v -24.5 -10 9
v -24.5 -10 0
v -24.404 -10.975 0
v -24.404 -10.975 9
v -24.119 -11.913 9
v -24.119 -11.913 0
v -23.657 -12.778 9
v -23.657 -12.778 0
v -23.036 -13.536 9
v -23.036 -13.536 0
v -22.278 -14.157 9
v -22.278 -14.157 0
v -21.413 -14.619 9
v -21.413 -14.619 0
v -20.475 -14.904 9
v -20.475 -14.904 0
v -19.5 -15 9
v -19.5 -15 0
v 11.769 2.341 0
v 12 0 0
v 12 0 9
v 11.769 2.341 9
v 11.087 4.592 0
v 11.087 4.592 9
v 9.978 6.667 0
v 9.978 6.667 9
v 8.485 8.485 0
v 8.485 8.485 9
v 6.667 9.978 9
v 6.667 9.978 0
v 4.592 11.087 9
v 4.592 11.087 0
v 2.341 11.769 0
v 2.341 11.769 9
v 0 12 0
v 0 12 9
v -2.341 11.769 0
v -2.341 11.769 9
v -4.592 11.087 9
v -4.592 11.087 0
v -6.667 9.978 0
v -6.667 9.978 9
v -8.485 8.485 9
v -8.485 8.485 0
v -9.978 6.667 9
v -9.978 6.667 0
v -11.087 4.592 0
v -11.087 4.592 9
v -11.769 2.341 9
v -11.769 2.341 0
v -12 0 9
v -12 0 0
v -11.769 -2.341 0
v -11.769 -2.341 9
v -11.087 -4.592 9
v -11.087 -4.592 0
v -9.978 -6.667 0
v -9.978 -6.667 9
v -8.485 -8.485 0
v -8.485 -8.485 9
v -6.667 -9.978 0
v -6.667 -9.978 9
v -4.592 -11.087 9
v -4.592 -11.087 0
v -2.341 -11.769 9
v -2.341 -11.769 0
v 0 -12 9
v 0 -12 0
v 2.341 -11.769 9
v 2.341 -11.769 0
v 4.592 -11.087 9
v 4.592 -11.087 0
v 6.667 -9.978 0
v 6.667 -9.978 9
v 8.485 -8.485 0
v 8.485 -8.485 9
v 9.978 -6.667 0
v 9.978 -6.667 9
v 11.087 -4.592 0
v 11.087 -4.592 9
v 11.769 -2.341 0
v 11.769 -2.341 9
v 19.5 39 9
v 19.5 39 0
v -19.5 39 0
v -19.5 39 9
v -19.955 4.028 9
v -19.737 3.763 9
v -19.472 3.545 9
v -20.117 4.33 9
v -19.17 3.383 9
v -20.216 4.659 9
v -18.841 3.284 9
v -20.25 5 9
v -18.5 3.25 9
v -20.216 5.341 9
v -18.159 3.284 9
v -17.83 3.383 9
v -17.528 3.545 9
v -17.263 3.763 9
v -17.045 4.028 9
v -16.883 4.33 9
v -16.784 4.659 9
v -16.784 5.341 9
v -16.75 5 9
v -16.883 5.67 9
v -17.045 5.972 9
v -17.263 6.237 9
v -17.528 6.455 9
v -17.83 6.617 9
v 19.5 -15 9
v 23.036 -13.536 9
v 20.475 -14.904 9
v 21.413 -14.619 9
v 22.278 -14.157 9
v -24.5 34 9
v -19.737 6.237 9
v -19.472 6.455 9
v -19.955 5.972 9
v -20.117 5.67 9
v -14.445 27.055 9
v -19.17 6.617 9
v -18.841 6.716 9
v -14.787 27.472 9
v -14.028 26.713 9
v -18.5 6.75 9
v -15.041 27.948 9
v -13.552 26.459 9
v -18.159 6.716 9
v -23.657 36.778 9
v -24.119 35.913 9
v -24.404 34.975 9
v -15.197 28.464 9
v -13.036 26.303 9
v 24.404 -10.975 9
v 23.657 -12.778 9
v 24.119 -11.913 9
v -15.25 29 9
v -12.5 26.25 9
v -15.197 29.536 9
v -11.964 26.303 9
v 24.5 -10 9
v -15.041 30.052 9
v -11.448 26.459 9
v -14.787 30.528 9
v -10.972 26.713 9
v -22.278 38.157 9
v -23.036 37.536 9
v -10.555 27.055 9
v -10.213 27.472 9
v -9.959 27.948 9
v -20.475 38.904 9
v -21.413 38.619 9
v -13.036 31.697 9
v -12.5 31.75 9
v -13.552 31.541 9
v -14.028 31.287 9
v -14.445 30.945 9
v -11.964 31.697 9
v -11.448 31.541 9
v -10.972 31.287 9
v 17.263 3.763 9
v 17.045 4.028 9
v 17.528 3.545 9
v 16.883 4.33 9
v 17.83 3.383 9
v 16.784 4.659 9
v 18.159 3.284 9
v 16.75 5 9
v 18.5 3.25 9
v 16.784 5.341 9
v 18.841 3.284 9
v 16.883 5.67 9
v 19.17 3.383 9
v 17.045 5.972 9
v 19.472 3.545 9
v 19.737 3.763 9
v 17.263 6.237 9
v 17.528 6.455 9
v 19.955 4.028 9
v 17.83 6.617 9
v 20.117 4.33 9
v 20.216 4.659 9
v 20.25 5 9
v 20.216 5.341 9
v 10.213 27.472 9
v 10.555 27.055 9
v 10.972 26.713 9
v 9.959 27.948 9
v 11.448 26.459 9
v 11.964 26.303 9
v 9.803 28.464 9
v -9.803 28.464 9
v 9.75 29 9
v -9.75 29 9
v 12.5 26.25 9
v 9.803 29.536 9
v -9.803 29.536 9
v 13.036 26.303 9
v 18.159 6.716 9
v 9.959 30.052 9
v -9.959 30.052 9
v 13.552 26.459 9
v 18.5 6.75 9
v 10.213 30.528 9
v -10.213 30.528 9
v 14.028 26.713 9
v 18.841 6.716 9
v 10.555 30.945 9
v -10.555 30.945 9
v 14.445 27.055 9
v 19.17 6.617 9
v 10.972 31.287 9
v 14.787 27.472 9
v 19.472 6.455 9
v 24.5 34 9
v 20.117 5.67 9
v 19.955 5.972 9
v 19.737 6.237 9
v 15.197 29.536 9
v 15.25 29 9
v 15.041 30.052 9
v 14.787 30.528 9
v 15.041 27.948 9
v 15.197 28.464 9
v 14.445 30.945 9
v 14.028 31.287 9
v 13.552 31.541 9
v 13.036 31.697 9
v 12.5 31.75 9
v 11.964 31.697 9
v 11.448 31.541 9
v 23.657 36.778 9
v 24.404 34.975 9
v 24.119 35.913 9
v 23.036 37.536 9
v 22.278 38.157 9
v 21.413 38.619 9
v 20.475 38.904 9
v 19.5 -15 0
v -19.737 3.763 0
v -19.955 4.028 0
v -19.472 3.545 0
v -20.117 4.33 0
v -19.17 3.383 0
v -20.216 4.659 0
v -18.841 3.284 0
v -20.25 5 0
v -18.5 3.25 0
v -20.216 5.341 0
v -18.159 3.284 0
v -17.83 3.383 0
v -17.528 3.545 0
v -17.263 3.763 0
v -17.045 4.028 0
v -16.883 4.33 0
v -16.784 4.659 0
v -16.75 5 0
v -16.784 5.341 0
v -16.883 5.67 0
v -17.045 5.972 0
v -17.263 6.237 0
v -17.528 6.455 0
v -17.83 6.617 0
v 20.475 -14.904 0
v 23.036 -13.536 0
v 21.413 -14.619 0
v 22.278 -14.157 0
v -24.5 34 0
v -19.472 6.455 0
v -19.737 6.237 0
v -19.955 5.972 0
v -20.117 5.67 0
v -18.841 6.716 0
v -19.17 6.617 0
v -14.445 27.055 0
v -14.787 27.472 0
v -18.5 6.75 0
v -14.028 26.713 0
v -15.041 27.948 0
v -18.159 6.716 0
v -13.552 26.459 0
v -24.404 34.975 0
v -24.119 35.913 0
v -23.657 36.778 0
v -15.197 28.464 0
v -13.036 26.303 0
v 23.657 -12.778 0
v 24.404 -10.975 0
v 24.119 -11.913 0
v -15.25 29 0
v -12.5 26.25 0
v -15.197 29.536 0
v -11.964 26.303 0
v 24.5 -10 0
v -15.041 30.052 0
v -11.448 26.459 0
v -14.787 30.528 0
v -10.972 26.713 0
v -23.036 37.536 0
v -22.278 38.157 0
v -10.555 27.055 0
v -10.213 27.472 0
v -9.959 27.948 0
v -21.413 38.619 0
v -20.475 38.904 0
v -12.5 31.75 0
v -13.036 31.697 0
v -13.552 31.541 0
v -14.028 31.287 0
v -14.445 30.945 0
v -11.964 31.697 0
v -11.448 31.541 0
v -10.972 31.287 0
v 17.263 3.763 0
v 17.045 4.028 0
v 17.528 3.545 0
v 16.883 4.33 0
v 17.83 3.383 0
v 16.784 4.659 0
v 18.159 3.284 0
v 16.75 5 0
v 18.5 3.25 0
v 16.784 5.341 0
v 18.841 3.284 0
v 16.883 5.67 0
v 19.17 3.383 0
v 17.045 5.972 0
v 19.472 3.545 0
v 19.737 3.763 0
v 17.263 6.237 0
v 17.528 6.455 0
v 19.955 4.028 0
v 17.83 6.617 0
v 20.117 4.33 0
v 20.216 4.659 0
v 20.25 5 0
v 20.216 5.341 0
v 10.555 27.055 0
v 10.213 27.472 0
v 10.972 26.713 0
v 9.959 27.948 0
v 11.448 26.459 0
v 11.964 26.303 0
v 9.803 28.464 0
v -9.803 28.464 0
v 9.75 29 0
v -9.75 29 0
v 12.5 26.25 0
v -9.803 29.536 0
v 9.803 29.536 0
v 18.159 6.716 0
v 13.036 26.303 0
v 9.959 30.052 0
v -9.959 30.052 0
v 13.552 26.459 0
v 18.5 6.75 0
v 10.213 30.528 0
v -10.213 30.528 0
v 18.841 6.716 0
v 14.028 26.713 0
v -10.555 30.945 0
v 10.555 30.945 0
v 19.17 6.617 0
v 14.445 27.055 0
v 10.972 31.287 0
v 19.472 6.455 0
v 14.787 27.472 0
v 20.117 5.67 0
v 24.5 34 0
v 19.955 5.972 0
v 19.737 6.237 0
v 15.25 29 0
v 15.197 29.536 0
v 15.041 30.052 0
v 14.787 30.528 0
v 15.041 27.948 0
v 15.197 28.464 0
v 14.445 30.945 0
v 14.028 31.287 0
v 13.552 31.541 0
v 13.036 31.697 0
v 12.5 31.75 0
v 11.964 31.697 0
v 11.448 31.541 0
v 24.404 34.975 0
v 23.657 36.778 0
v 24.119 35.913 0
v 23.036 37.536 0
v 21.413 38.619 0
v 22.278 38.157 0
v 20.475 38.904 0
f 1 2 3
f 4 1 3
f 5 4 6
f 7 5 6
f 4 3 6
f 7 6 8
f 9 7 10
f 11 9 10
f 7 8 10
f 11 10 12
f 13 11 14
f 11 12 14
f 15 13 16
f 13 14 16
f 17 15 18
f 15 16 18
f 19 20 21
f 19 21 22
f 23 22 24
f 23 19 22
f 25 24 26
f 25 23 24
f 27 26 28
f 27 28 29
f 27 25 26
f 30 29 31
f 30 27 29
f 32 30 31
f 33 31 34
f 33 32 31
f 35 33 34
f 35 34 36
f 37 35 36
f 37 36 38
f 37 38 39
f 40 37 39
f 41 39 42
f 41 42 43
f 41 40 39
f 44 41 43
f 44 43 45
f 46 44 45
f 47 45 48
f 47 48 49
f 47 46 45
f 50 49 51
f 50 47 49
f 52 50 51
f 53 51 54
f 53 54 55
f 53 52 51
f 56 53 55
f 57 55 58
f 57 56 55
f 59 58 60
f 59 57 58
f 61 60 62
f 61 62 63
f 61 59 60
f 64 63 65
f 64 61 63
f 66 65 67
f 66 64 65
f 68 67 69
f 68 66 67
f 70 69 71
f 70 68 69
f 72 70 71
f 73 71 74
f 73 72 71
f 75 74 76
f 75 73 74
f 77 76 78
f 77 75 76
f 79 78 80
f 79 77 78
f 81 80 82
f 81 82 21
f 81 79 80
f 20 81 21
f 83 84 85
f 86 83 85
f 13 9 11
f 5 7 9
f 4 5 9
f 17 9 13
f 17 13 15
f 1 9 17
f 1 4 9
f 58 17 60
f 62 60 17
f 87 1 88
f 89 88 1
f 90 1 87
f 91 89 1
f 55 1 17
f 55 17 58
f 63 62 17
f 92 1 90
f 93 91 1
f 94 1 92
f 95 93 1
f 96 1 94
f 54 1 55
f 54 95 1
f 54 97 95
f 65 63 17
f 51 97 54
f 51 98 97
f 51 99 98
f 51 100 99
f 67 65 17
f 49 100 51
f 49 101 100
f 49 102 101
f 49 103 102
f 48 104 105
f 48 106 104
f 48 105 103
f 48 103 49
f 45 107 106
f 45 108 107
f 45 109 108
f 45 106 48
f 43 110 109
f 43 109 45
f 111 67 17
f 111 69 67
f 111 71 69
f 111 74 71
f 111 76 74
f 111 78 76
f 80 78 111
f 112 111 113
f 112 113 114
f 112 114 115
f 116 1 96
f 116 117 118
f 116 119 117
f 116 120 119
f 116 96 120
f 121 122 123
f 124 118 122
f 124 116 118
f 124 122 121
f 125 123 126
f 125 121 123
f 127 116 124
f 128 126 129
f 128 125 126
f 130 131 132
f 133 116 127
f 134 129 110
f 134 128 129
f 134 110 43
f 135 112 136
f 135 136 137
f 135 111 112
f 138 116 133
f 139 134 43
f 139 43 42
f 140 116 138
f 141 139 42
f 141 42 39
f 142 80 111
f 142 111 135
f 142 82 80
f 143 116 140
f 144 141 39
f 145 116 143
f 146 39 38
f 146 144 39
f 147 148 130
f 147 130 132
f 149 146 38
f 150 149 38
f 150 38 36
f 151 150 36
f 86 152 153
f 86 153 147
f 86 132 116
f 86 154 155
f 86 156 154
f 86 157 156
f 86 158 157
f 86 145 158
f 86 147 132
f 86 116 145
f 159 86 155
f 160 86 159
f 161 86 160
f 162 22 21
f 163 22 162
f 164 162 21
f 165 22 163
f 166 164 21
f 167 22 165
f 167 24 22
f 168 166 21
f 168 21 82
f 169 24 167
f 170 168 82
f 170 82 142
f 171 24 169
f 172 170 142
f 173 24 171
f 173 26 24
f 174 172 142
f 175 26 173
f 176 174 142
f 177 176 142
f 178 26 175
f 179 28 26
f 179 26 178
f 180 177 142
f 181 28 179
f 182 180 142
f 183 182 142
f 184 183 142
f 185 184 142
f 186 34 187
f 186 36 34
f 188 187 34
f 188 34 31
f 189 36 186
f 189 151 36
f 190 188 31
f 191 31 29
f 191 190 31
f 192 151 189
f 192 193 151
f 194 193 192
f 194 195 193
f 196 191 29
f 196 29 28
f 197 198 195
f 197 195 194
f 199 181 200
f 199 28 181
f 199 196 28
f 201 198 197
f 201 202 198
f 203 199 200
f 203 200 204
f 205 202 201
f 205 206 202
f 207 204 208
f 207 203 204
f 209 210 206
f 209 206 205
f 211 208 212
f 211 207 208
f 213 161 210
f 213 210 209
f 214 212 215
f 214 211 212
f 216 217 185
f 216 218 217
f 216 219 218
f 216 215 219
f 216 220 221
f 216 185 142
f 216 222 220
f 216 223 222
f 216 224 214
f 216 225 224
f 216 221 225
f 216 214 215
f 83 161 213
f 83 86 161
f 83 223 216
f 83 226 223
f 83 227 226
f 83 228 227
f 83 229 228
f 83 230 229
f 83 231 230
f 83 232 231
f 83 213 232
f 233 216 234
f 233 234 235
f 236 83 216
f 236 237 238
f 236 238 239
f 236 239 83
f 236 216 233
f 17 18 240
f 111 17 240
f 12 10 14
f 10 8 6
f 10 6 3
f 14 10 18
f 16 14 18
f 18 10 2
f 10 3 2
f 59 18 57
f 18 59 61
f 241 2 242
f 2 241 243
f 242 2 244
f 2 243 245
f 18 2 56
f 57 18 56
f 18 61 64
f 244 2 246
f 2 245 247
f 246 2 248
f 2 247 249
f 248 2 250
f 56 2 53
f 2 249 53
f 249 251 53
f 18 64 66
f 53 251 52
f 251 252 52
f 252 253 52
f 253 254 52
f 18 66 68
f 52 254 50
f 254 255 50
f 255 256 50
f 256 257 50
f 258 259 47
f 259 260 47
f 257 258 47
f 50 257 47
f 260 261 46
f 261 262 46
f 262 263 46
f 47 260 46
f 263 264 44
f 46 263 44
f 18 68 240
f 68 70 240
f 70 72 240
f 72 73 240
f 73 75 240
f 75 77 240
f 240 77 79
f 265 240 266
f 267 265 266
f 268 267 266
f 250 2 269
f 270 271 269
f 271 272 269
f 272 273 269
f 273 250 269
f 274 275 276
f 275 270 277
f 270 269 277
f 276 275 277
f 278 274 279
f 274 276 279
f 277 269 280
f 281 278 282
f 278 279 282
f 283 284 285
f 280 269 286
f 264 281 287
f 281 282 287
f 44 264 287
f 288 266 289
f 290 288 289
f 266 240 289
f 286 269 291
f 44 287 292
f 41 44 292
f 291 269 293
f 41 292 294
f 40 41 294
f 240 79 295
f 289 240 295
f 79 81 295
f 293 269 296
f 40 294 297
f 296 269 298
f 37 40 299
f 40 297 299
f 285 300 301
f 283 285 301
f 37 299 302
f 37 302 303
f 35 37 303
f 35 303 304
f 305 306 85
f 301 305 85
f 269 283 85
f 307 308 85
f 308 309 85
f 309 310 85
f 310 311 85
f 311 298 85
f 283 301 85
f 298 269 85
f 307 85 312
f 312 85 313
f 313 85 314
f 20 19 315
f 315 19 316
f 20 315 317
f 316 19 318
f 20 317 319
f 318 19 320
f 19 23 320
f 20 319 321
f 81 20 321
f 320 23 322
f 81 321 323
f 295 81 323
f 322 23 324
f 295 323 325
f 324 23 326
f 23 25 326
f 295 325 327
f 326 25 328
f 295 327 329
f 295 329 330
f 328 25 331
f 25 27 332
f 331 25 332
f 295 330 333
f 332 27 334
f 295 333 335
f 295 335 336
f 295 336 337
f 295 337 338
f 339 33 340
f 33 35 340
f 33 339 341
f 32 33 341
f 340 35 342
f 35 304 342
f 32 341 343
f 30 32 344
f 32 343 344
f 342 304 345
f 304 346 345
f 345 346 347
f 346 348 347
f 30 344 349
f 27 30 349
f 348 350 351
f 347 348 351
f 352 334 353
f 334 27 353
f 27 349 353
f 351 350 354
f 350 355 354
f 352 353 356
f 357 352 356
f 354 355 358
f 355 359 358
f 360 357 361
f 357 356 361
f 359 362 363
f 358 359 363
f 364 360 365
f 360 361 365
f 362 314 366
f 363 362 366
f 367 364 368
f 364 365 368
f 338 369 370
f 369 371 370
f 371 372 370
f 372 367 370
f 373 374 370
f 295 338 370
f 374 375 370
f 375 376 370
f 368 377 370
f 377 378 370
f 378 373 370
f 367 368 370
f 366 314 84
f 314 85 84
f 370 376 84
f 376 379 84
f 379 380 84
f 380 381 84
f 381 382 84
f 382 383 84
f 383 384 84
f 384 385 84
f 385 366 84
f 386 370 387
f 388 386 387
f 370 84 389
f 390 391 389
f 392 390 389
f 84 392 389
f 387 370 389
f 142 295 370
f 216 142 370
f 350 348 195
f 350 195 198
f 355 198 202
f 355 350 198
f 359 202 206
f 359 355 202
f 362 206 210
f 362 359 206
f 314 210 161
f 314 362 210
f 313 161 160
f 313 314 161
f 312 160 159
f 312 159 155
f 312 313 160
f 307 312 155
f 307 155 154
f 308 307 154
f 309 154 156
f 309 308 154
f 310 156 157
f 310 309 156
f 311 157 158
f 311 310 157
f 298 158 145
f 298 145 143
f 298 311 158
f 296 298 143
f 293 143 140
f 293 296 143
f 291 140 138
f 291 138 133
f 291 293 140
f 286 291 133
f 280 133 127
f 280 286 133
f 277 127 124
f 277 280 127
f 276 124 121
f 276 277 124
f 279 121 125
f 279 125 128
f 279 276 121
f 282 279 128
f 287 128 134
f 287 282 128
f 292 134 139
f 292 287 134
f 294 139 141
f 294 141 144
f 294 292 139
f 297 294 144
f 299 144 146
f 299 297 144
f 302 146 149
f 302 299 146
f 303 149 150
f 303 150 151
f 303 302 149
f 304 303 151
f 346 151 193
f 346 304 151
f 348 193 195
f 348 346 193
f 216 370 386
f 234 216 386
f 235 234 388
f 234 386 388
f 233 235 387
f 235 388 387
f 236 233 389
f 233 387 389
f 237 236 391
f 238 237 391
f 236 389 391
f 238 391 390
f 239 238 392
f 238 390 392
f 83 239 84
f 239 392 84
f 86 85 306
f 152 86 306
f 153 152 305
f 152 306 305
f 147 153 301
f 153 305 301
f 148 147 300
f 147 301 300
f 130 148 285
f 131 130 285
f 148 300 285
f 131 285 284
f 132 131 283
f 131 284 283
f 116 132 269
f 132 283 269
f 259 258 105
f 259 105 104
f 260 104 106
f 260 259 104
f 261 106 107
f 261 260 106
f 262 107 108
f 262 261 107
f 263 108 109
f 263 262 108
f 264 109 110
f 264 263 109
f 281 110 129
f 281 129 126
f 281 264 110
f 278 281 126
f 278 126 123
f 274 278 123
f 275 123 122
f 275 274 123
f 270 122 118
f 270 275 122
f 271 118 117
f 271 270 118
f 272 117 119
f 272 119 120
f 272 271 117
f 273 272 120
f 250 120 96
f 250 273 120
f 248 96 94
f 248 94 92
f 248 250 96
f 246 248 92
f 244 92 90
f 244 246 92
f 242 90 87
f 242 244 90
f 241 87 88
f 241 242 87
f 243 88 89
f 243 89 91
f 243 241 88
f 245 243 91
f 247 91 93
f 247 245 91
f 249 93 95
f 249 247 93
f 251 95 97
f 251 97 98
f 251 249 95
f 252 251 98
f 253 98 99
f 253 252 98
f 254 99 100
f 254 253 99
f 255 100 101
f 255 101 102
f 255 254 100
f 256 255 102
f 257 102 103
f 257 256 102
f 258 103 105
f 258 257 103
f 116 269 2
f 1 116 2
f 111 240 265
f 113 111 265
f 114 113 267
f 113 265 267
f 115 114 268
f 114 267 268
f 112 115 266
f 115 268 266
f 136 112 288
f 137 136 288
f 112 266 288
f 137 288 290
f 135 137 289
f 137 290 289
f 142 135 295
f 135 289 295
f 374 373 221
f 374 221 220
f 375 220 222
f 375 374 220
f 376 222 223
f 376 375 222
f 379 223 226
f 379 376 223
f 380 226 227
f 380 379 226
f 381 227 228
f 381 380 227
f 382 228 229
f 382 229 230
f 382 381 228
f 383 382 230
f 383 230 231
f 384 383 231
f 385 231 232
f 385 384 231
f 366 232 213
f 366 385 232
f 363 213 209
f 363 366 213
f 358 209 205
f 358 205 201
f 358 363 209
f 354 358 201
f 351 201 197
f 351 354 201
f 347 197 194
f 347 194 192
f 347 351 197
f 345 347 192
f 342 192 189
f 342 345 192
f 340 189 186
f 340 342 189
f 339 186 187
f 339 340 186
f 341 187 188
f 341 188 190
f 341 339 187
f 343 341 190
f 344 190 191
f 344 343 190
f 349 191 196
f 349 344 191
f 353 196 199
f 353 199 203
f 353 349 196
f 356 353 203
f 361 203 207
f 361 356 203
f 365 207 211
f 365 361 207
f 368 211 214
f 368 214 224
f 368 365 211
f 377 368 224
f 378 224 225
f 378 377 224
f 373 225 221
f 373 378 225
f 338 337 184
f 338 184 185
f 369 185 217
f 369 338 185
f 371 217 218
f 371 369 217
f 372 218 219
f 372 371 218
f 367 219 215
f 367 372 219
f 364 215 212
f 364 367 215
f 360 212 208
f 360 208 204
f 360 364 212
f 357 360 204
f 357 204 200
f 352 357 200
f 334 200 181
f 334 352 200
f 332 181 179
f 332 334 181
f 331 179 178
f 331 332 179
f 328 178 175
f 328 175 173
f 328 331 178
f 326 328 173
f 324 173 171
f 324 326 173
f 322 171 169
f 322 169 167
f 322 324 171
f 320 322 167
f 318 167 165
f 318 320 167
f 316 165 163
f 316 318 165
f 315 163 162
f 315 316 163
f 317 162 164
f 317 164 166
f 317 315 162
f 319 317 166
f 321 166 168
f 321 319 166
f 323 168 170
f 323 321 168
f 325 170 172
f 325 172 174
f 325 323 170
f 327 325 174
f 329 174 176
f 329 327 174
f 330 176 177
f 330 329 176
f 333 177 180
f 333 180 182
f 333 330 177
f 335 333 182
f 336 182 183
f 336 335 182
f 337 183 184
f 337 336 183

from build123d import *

# Parameters (mm, degrees)
F0_R     = 1.75
F0_R_2   = 12
F0_R_3   = 2.75
F1_DEPTH = 9


with BuildPart() as f1:
    # F0 (on Top) → F1 (new body)
    with BuildSketch(Plane.XY):
        with BuildLine():
            Line((19.5, 39), (-19.5, 39))
            ThreePointArc((-19.5, 39), (-23.035534, 37.535534), (-24.5, 34))
            Line((-24.5, 34), (-24.5, -10))
            ThreePointArc((-24.5, -10), (-23.035534, -13.535534), (-19.5, -15))
            Line((-19.5, -15), (19.5, -15))
            ThreePointArc((19.5, -15), (23.035534, -13.535534), (24.5, -10))
            Line((24.5, -10), (24.5, 34))
            ThreePointArc((24.5, 34), (23.035534, 37.535534), (19.5, 39))
        make_face()
        with Locations((-18.5, 5)):
            Circle(F0_R, mode=Mode.SUBTRACT)
        Circle(F0_R_2, mode=Mode.SUBTRACT)
        with Locations((18.5, 5)):
            Circle(F0_R, mode=Mode.SUBTRACT)
        with Locations((-12.5, 29)):
            Circle(F0_R_3, mode=Mode.SUBTRACT)
        with Locations((12.5, 29)):
            Circle(F0_R_3, mode=Mode.SUBTRACT)
    extrude(amount=F1_DEPTH)


solid = f1.part
